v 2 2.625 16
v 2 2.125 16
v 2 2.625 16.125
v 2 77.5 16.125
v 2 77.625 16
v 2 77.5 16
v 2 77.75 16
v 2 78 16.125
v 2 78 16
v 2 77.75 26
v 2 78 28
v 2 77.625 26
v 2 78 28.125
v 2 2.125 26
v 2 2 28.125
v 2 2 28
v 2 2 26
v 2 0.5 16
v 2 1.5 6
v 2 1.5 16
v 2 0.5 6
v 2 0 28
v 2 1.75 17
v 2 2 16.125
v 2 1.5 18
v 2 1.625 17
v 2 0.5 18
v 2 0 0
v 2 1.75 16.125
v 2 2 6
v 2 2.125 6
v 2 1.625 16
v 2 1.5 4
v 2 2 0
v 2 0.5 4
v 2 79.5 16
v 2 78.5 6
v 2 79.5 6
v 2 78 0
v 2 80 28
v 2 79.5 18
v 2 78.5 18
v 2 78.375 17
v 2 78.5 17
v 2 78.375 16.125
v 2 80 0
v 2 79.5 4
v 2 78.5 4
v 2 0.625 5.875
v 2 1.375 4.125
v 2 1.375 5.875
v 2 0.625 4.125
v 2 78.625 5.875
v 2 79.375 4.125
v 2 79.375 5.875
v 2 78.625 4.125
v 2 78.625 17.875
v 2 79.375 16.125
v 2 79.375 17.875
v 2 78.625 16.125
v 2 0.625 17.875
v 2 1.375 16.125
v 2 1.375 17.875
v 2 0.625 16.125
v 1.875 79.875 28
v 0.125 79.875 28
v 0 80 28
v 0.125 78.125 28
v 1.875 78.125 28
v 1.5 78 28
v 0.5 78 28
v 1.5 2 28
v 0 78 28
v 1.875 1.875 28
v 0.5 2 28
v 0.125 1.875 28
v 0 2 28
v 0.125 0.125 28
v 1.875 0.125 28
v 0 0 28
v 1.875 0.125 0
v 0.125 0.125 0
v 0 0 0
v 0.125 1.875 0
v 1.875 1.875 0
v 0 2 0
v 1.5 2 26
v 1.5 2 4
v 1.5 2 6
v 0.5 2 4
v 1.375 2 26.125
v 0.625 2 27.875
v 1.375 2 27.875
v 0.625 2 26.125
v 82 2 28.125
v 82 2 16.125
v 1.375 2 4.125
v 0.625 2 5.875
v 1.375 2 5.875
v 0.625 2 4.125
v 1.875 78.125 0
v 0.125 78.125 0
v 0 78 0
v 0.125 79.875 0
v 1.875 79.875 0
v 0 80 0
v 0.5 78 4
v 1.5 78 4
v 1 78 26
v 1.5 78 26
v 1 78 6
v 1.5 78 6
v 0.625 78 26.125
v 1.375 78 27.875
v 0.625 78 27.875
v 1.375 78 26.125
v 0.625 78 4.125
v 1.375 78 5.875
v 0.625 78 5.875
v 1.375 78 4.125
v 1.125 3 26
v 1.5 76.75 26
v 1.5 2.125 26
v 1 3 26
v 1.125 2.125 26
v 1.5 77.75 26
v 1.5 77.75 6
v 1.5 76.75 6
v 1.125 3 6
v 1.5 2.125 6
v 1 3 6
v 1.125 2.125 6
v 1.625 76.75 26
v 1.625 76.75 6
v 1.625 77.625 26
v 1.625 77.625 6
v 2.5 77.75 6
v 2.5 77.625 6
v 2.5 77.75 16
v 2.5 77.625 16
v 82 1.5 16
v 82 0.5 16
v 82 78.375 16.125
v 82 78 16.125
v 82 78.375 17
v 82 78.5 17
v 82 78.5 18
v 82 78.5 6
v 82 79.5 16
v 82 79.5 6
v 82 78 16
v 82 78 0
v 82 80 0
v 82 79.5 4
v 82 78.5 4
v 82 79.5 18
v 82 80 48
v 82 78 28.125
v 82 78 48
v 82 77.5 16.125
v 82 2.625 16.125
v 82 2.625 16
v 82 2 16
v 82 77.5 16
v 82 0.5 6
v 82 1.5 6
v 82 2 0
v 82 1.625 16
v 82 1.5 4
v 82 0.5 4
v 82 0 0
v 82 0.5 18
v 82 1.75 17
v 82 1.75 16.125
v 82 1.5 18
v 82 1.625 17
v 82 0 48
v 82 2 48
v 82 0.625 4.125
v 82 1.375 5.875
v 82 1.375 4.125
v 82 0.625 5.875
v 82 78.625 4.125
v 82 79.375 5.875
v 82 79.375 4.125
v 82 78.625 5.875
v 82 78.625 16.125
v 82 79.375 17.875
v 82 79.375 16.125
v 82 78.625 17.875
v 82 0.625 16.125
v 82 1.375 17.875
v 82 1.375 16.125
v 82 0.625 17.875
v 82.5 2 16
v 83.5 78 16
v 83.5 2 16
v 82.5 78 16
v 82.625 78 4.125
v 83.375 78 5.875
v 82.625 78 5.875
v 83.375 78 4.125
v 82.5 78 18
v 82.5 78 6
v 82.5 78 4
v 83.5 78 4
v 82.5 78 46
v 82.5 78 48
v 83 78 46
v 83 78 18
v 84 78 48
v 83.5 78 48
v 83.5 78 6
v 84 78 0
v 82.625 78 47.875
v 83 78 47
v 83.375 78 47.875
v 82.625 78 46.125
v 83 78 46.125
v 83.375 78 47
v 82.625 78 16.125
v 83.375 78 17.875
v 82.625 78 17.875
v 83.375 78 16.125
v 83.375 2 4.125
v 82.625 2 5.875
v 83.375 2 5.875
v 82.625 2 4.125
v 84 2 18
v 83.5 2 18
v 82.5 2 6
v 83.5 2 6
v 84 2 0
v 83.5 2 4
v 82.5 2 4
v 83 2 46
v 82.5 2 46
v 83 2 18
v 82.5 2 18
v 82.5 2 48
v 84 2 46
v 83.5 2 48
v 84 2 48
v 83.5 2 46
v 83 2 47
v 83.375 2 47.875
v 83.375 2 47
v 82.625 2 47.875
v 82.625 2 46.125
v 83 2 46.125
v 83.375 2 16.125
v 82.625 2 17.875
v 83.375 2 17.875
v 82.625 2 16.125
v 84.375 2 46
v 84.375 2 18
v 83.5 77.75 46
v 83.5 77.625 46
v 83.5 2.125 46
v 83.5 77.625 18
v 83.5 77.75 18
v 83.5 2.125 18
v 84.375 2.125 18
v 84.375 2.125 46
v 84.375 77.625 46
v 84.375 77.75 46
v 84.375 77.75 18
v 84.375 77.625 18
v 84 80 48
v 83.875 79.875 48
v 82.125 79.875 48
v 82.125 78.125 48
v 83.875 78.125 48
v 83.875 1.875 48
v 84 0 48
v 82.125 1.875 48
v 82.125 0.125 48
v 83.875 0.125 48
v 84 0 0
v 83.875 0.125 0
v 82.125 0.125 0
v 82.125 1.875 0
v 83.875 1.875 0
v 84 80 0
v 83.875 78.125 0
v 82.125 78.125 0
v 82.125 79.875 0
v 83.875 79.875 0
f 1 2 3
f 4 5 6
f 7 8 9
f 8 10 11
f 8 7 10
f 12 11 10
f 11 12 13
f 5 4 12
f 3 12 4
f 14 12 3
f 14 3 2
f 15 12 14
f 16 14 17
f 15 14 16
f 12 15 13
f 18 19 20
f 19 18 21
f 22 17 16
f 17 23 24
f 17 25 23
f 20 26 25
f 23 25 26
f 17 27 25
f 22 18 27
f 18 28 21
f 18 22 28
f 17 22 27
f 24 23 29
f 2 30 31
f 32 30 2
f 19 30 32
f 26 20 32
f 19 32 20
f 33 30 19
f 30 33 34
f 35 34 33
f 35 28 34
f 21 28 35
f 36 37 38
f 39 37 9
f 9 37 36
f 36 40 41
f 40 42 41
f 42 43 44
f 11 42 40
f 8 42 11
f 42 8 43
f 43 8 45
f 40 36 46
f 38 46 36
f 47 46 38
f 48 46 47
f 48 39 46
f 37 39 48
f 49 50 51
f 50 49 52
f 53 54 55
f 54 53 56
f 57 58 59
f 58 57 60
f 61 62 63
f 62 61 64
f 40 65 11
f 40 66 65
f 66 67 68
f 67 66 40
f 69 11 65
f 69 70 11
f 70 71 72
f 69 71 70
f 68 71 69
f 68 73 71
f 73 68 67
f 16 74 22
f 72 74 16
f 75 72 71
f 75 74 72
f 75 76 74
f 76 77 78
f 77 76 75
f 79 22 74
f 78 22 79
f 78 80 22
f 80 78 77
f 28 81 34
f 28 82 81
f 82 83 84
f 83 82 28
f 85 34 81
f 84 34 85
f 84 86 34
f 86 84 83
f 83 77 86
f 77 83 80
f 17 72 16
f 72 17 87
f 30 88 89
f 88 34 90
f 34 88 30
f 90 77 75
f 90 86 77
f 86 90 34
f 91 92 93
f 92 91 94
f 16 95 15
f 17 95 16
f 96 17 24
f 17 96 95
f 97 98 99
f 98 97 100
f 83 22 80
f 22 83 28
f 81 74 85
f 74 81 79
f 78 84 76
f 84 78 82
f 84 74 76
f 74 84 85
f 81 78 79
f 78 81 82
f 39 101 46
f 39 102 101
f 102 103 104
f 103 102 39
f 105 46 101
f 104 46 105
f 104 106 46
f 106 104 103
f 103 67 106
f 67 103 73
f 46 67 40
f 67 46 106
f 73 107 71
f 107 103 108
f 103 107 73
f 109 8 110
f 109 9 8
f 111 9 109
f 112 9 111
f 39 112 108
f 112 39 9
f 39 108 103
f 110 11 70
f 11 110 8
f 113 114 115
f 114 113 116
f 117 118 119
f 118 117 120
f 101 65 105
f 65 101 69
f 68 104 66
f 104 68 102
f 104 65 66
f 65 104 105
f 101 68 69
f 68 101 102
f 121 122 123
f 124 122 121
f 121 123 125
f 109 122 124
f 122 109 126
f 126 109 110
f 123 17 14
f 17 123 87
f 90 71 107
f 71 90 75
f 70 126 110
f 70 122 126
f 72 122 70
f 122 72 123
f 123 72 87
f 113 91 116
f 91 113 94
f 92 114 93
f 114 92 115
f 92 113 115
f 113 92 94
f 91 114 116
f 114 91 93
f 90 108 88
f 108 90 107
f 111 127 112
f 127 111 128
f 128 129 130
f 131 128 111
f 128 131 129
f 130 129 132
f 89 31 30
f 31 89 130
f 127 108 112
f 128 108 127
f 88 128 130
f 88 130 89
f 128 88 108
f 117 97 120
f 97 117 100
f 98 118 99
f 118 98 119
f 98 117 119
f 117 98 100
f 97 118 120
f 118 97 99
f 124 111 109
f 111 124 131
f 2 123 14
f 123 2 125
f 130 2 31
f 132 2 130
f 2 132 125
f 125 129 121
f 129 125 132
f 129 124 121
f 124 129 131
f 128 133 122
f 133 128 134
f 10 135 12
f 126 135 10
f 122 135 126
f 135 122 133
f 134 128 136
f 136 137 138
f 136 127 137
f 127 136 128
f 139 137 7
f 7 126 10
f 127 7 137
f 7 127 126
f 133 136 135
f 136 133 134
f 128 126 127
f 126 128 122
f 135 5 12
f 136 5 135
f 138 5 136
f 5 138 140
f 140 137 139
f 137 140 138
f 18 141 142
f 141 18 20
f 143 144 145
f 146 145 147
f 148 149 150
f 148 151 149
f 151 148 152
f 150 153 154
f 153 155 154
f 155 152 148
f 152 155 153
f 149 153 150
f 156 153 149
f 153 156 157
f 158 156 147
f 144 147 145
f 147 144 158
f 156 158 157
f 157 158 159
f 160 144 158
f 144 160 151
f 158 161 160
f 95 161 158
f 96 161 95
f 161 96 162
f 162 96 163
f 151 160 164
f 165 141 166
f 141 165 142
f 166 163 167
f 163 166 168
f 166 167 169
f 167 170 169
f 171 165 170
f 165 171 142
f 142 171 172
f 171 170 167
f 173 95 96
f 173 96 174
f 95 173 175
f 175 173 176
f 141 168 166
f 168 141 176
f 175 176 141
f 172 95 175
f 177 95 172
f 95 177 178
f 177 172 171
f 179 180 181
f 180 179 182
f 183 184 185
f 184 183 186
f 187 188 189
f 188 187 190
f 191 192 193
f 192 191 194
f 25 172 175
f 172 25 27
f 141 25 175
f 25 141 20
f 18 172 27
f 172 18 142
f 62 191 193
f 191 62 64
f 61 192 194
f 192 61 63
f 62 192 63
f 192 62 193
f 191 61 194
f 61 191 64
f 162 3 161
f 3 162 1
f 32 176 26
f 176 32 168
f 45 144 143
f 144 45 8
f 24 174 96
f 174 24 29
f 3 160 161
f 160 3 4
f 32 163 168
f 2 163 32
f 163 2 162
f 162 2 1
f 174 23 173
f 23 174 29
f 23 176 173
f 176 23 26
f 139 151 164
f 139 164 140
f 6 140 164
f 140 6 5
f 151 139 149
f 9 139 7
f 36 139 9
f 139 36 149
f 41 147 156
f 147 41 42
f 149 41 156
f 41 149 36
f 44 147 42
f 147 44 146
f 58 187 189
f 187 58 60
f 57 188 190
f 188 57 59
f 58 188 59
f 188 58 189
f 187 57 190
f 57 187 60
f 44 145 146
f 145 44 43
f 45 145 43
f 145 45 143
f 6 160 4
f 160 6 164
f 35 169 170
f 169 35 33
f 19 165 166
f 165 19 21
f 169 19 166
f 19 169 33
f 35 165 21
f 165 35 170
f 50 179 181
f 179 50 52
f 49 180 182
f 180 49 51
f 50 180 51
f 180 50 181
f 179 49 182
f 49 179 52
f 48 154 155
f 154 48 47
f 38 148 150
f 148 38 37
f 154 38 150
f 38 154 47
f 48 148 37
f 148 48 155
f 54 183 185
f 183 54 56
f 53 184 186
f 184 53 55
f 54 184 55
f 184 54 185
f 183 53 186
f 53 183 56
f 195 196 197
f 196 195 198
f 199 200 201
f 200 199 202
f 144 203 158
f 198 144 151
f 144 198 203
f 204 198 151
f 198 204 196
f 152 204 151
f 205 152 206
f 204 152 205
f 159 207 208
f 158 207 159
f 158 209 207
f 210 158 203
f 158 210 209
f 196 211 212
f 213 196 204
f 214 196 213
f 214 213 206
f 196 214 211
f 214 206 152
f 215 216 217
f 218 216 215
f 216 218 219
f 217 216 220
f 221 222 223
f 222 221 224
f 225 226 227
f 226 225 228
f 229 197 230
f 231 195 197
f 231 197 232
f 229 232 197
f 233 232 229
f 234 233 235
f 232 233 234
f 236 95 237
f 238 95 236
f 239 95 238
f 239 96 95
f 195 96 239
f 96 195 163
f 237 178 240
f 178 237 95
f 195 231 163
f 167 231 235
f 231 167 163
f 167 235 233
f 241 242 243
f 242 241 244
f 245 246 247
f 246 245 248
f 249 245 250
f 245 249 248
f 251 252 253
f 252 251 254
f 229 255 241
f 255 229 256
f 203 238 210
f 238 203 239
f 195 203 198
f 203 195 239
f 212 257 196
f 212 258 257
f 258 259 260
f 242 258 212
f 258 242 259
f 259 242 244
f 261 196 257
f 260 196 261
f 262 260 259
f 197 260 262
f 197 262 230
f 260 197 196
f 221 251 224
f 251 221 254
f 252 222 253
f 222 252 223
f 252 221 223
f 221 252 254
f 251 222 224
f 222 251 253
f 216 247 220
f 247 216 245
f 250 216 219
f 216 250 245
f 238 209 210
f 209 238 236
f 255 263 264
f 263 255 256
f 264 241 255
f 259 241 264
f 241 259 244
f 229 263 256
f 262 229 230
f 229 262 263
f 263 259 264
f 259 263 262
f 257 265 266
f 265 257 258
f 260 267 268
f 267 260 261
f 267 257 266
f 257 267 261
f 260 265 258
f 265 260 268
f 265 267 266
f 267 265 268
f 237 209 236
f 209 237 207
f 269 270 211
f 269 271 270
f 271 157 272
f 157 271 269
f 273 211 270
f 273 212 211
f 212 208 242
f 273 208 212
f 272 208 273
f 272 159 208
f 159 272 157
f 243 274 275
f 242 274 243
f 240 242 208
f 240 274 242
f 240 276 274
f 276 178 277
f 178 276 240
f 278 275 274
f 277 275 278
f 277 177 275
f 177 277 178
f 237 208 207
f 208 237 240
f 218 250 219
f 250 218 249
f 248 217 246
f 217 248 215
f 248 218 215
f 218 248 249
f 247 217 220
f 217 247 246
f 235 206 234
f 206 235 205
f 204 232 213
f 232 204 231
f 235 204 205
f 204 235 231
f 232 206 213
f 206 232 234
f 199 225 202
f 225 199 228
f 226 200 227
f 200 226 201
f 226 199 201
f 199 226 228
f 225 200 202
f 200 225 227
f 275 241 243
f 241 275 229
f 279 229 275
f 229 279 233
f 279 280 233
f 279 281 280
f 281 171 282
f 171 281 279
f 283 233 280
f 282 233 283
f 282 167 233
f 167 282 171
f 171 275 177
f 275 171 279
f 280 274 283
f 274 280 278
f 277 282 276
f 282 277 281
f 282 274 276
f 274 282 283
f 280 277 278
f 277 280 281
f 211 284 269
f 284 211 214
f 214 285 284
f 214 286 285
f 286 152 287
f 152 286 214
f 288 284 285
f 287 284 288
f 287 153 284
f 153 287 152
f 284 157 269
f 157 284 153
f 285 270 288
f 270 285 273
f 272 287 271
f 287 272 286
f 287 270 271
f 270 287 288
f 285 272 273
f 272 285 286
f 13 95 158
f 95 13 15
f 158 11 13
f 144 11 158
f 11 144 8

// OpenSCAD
// file: parts.scad
module rectangularTube(height, width, length, thickness) {
    difference()
    {
        cube([height, width, length]);
        translate([thickness, thickness, 0]) {
            cube([height - 2*thickness, width - 2*thickness, length]);
        };
    }
};

module angleIron(height, width, length, thickness) {
    union()
    {
        cube([height, thickness, length]);
        rotate([0, -90, 0]) {
            translate([0, 0, -1 * thickness]) {
                cube([length, width, thickness]);
            }
        }
    }
}

module tube(outer, thickness, length) {
    outerRadius = outer / 2;
    innerRadius = outerRadius - thickness;
    difference() {
        cylinder(length, outerRadius, outerRadius, $fn=32);
        cylinder(length, innerRadius, innerRadius, $fn=32);
    }

}

module flatBar(thickness, width, length) {
    cube([width, length, thickness]);
}


rectangularTube(4, 4, 12, .25);

translate([ 10, 0, 0]) {
    angleIron( 4, 4, 12, .25);
}

translate([ 22, 2, 0]) {
    tube(4, .25, 12);
}

translate([ 30, 0, 0]) {
    rotate([90, 0, 0]) {
        flatBar(.25, 4, 12);
    }
}
// main file
use <parts.scad>;

mattressLength=80;
mattressWidth=76;
bedHeight = 18;
structualHeight = 2;
structualWidth = 1;
postSize = 2;
centerOffset = (postSize - structualWidth) /2;
bedLength = mattressLength + 2* structualHeight;
siderailLength = bedLength - 2*structualHeight;
crossLength = 78;
headboardHeight = 48;
footboardHeight = bedHeight +10 ;
clearance = 6;

angleIronThickness = .125;

numPostTubes = 0;

// Structual members
module structuralTube(length) {
    color("grey")
    rectangularTube(structualHeight, structualWidth, length, .125);
}

module postTube(length) {
    color("grey")
    rectangularTube(postSize, postSize, length, .125);
}

module supportLedge(length) {
    angleIron(1, 1, length, angleIronThickness);
}

module crossrail() {
    structuralTube( crossLength - postSize);
}

module woodPanel(x, y, z) {
    color("brown")
    cube([x, y, z]);
}

module mattress() {
    color("white")
    cube([ mattressLength, mattressWidth, 12 ]);
}

//
// Bed design
//

// Footboard legs
postTube(footboardHeight);

translate([ 0, crossLength, 0 ]) {
    postTube(footboardHeight);
}


// Footboard
footboardSupportLength = footboardHeight - clearance - structualHeight;

translate([ structualWidth + centerOffset, postSize, footboardHeight ]) {
    rotate([ -90, 90, 0 ]) {
        crossrail();
    }


}
translate([ structualWidth - centerOffset, postSize, clearance]){
    woodPanel(.5, crossLength - postSize, footboardHeight - structualHeight - clearance);
}

translate([ structualWidth + centerOffset, postSize, clearance ]) {
    rotate([ -90, 90, 0 ]) {
        crossrail();
    }

    translate([ -0.5 * structualWidth, 0, 0]) {
        supportLedge(footboardSupportLength);
    }
    translate([ 0, crossLength - structualWidth * 2 - 2* angleIronThickness, 0] ) {
        rotate([ 0, 0, 270 ]) {
            supportLedge( footboardSupportLength );
        }
    }
}

// Siderails
rotate([ 0, 90, 0 ]) {
    translate([ -1 * bedHeight, centerOffset, ,structualHeight]) {
        structuralTube( siderailLength );
        translate([ structualHeight, structualWidth + .125, 0]) {
            rotate([0, 0, 90]) {
                supportLedge( siderailLength );
            }
        }

        translate([ 0, crossLength, 0 ]) {
            structuralTube(siderailLength);
            translate([structualHeight, 0, 0]) {
                rotate([0, 0, 180]) {
                    supportLedge( siderailLength );
                }
            }
        }
    }
    translate([ -1 * clearance, centerOffset, ,structualHeight]) {
        structuralTube( siderailLength );

        translate([ 0, crossLength, 0 ]) {
            structuralTube(siderailLength);
        }
    }
}

// Headboard
translate([ bedLength - centerOffset, postSize, bedHeight ]) {
    rotate([ -90, 90, 0 ]) {
        crossrail();
    }
    translate([ -1 * centerOffset, 0, 0] ){
        woodPanel(.5, crossLength - postSize, headboardHeight - bedHeight - structualWidth);
    }
}

headboardSupportLength = headboardHeight - bedHeight - structualHeight;

translate([ bedLength - centerOffset - angleIronThickness, postSize, bedHeight]) {
    supportLedge( headboardSupportLength );
    translate([ 0, crossLength - structualWidth * 2 - 2* angleIronThickness, 0] ) {
        rotate([ 0, 0, 270 ]) {
            supportLedge( headboardSupportLength );
        }
    }

}

translate([ bedLength - centerOffset, postSize, headboardHeight]) {
    rotate([ -90, 90, 0 ]) {
        crossrail();
    }
}

translate([ bedLength - centerOffset, postSize, clearance]) {
    rotate([ -90, 90, 0 ]) {
        crossrail();
    }
}

// Headboard legs
translate([ 82, 0, 0 ]) {
    postTube(headboardHeight);

    translate([ 0, crossLength, 0 ]) {
        postTube( headboardHeight);
    }
}

// Mattress

translate([ structualHeight, structualWidth + 8*angleIronThickness, bedHeight - structualHeight + angleIronThickness]){
    mattress();
}
